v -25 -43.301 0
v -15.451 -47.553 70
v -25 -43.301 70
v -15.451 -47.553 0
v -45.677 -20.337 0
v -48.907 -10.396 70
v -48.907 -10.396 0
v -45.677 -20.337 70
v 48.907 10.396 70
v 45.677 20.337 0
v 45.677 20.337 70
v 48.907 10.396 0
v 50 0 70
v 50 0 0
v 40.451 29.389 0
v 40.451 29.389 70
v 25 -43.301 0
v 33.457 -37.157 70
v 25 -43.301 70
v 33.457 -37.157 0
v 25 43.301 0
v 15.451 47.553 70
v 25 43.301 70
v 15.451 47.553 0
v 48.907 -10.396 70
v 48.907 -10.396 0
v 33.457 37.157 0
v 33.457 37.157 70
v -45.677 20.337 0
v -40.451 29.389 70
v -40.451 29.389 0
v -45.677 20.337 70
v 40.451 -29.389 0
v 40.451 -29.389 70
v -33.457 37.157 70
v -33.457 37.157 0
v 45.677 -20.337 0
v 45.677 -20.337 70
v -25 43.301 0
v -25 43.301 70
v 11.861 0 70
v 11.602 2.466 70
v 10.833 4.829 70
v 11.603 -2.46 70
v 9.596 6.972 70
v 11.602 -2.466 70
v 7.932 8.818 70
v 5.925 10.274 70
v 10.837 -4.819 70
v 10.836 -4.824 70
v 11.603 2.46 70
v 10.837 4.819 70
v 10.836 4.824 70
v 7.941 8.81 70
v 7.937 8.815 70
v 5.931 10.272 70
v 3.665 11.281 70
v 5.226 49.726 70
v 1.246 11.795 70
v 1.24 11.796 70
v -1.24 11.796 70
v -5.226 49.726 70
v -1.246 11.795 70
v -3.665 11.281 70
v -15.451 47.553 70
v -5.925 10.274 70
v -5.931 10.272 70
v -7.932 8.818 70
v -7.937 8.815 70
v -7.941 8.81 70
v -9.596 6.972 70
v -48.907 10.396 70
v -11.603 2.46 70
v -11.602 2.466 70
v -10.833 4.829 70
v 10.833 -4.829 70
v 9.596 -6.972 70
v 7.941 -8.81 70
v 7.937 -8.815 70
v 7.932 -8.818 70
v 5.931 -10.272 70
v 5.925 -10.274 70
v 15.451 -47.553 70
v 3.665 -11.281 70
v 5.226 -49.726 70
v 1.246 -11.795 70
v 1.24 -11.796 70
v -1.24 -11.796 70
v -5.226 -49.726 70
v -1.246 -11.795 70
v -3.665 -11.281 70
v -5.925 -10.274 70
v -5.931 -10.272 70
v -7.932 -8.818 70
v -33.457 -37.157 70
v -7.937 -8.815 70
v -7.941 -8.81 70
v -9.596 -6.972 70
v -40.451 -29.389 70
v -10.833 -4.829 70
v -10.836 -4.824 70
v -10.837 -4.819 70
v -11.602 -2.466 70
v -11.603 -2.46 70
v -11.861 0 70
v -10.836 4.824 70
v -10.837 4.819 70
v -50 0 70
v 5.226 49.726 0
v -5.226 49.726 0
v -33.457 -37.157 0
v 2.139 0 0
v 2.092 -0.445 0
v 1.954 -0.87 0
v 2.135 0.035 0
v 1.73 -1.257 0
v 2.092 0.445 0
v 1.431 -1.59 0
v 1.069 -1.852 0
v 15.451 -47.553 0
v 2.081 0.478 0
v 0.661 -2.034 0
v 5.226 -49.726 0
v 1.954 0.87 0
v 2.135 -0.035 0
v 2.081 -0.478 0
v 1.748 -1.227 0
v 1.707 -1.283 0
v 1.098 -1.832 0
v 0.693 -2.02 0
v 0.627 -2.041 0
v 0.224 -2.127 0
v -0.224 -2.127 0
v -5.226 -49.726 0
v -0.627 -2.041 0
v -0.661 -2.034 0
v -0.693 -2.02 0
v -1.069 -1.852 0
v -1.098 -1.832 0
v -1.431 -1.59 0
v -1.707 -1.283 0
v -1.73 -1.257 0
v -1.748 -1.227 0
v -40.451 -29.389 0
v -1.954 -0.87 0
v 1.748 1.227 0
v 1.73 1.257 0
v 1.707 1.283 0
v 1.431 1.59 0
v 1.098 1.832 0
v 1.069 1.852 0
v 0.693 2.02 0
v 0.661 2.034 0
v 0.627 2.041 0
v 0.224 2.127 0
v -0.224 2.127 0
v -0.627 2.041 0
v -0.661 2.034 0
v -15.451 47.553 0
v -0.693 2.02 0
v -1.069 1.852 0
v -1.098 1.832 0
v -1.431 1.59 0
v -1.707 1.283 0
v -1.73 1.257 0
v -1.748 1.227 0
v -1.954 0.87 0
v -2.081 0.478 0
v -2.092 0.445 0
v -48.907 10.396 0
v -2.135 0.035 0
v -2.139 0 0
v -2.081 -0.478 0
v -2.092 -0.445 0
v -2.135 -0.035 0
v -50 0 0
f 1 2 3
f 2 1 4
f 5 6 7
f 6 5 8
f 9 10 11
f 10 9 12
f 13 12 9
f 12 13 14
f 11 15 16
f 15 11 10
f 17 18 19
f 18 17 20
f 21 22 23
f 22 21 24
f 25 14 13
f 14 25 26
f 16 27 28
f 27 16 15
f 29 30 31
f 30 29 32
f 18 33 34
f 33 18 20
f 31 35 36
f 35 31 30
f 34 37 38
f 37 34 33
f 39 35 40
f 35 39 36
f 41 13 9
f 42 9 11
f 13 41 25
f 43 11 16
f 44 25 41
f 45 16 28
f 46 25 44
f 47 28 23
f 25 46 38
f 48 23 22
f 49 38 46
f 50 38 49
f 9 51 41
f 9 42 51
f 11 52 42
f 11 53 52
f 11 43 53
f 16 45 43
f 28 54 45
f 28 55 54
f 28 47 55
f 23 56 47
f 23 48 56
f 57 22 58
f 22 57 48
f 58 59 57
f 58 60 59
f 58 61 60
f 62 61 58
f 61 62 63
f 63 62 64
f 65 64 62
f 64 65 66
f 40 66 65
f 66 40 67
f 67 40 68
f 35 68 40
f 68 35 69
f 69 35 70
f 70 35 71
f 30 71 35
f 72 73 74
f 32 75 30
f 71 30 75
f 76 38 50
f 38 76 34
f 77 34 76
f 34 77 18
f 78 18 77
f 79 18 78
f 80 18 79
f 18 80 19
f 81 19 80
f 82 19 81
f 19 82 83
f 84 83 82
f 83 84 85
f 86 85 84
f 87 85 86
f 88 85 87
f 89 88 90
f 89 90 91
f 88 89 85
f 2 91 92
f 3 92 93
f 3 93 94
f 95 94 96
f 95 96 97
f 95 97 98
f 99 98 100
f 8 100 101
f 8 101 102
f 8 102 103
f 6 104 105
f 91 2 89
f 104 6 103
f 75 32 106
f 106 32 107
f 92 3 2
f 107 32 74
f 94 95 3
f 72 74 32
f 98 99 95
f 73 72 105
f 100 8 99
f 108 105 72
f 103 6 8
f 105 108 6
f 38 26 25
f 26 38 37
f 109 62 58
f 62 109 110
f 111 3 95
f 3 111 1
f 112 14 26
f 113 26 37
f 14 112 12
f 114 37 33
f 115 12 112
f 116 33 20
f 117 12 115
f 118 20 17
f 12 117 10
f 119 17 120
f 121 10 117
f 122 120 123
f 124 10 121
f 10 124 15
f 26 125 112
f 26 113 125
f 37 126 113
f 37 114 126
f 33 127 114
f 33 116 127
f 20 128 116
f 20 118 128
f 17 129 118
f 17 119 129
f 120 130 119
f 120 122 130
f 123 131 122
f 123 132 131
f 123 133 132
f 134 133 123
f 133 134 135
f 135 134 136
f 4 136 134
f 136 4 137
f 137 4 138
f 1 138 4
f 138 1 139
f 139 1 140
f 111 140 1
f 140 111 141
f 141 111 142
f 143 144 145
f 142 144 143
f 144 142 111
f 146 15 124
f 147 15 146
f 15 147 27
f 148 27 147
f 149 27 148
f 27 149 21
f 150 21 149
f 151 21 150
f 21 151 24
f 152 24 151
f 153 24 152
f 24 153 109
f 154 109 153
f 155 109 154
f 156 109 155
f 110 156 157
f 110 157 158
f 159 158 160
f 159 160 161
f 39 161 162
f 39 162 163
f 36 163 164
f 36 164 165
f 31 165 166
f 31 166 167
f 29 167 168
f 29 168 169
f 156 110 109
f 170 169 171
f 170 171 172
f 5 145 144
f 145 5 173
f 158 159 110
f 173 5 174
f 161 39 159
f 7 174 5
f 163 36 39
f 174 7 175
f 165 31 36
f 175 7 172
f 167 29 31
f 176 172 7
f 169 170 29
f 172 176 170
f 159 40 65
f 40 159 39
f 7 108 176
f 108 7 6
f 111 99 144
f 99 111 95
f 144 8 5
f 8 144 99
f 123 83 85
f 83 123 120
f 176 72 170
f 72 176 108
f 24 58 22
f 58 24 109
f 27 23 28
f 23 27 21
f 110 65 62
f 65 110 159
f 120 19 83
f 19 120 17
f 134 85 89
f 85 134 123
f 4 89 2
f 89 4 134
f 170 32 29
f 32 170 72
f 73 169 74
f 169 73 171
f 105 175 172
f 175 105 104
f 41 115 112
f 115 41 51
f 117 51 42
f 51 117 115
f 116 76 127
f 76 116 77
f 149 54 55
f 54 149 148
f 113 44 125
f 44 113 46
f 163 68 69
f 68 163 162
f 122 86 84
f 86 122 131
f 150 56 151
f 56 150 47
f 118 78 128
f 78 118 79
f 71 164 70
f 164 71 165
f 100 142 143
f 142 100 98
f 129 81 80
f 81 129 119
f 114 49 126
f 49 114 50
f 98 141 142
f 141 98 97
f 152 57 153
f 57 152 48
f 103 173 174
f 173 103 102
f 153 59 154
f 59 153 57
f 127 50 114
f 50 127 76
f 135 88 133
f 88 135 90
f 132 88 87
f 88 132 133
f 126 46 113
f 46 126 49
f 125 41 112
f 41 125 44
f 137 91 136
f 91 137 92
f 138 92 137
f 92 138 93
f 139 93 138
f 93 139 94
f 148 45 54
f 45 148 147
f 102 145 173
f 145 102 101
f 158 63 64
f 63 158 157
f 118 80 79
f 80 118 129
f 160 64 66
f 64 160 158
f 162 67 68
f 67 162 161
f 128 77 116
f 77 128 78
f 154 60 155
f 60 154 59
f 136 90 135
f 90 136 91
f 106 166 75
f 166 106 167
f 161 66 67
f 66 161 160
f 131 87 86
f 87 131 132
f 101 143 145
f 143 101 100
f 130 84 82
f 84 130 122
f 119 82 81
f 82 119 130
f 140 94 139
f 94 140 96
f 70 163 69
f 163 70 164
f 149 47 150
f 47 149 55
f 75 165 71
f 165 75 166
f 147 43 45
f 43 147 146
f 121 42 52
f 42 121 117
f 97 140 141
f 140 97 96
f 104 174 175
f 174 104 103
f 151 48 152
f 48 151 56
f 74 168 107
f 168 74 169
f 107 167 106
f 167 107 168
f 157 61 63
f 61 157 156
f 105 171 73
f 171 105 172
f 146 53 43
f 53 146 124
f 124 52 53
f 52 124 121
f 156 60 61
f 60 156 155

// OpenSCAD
difference()
{
        for(i=[0:2])

        cylinder(r=50,h=70);

        for(i=[0:2])
        translate([0,0,-1])
        cylinder(r=40,h=72, r1=2, r2=12);
}
